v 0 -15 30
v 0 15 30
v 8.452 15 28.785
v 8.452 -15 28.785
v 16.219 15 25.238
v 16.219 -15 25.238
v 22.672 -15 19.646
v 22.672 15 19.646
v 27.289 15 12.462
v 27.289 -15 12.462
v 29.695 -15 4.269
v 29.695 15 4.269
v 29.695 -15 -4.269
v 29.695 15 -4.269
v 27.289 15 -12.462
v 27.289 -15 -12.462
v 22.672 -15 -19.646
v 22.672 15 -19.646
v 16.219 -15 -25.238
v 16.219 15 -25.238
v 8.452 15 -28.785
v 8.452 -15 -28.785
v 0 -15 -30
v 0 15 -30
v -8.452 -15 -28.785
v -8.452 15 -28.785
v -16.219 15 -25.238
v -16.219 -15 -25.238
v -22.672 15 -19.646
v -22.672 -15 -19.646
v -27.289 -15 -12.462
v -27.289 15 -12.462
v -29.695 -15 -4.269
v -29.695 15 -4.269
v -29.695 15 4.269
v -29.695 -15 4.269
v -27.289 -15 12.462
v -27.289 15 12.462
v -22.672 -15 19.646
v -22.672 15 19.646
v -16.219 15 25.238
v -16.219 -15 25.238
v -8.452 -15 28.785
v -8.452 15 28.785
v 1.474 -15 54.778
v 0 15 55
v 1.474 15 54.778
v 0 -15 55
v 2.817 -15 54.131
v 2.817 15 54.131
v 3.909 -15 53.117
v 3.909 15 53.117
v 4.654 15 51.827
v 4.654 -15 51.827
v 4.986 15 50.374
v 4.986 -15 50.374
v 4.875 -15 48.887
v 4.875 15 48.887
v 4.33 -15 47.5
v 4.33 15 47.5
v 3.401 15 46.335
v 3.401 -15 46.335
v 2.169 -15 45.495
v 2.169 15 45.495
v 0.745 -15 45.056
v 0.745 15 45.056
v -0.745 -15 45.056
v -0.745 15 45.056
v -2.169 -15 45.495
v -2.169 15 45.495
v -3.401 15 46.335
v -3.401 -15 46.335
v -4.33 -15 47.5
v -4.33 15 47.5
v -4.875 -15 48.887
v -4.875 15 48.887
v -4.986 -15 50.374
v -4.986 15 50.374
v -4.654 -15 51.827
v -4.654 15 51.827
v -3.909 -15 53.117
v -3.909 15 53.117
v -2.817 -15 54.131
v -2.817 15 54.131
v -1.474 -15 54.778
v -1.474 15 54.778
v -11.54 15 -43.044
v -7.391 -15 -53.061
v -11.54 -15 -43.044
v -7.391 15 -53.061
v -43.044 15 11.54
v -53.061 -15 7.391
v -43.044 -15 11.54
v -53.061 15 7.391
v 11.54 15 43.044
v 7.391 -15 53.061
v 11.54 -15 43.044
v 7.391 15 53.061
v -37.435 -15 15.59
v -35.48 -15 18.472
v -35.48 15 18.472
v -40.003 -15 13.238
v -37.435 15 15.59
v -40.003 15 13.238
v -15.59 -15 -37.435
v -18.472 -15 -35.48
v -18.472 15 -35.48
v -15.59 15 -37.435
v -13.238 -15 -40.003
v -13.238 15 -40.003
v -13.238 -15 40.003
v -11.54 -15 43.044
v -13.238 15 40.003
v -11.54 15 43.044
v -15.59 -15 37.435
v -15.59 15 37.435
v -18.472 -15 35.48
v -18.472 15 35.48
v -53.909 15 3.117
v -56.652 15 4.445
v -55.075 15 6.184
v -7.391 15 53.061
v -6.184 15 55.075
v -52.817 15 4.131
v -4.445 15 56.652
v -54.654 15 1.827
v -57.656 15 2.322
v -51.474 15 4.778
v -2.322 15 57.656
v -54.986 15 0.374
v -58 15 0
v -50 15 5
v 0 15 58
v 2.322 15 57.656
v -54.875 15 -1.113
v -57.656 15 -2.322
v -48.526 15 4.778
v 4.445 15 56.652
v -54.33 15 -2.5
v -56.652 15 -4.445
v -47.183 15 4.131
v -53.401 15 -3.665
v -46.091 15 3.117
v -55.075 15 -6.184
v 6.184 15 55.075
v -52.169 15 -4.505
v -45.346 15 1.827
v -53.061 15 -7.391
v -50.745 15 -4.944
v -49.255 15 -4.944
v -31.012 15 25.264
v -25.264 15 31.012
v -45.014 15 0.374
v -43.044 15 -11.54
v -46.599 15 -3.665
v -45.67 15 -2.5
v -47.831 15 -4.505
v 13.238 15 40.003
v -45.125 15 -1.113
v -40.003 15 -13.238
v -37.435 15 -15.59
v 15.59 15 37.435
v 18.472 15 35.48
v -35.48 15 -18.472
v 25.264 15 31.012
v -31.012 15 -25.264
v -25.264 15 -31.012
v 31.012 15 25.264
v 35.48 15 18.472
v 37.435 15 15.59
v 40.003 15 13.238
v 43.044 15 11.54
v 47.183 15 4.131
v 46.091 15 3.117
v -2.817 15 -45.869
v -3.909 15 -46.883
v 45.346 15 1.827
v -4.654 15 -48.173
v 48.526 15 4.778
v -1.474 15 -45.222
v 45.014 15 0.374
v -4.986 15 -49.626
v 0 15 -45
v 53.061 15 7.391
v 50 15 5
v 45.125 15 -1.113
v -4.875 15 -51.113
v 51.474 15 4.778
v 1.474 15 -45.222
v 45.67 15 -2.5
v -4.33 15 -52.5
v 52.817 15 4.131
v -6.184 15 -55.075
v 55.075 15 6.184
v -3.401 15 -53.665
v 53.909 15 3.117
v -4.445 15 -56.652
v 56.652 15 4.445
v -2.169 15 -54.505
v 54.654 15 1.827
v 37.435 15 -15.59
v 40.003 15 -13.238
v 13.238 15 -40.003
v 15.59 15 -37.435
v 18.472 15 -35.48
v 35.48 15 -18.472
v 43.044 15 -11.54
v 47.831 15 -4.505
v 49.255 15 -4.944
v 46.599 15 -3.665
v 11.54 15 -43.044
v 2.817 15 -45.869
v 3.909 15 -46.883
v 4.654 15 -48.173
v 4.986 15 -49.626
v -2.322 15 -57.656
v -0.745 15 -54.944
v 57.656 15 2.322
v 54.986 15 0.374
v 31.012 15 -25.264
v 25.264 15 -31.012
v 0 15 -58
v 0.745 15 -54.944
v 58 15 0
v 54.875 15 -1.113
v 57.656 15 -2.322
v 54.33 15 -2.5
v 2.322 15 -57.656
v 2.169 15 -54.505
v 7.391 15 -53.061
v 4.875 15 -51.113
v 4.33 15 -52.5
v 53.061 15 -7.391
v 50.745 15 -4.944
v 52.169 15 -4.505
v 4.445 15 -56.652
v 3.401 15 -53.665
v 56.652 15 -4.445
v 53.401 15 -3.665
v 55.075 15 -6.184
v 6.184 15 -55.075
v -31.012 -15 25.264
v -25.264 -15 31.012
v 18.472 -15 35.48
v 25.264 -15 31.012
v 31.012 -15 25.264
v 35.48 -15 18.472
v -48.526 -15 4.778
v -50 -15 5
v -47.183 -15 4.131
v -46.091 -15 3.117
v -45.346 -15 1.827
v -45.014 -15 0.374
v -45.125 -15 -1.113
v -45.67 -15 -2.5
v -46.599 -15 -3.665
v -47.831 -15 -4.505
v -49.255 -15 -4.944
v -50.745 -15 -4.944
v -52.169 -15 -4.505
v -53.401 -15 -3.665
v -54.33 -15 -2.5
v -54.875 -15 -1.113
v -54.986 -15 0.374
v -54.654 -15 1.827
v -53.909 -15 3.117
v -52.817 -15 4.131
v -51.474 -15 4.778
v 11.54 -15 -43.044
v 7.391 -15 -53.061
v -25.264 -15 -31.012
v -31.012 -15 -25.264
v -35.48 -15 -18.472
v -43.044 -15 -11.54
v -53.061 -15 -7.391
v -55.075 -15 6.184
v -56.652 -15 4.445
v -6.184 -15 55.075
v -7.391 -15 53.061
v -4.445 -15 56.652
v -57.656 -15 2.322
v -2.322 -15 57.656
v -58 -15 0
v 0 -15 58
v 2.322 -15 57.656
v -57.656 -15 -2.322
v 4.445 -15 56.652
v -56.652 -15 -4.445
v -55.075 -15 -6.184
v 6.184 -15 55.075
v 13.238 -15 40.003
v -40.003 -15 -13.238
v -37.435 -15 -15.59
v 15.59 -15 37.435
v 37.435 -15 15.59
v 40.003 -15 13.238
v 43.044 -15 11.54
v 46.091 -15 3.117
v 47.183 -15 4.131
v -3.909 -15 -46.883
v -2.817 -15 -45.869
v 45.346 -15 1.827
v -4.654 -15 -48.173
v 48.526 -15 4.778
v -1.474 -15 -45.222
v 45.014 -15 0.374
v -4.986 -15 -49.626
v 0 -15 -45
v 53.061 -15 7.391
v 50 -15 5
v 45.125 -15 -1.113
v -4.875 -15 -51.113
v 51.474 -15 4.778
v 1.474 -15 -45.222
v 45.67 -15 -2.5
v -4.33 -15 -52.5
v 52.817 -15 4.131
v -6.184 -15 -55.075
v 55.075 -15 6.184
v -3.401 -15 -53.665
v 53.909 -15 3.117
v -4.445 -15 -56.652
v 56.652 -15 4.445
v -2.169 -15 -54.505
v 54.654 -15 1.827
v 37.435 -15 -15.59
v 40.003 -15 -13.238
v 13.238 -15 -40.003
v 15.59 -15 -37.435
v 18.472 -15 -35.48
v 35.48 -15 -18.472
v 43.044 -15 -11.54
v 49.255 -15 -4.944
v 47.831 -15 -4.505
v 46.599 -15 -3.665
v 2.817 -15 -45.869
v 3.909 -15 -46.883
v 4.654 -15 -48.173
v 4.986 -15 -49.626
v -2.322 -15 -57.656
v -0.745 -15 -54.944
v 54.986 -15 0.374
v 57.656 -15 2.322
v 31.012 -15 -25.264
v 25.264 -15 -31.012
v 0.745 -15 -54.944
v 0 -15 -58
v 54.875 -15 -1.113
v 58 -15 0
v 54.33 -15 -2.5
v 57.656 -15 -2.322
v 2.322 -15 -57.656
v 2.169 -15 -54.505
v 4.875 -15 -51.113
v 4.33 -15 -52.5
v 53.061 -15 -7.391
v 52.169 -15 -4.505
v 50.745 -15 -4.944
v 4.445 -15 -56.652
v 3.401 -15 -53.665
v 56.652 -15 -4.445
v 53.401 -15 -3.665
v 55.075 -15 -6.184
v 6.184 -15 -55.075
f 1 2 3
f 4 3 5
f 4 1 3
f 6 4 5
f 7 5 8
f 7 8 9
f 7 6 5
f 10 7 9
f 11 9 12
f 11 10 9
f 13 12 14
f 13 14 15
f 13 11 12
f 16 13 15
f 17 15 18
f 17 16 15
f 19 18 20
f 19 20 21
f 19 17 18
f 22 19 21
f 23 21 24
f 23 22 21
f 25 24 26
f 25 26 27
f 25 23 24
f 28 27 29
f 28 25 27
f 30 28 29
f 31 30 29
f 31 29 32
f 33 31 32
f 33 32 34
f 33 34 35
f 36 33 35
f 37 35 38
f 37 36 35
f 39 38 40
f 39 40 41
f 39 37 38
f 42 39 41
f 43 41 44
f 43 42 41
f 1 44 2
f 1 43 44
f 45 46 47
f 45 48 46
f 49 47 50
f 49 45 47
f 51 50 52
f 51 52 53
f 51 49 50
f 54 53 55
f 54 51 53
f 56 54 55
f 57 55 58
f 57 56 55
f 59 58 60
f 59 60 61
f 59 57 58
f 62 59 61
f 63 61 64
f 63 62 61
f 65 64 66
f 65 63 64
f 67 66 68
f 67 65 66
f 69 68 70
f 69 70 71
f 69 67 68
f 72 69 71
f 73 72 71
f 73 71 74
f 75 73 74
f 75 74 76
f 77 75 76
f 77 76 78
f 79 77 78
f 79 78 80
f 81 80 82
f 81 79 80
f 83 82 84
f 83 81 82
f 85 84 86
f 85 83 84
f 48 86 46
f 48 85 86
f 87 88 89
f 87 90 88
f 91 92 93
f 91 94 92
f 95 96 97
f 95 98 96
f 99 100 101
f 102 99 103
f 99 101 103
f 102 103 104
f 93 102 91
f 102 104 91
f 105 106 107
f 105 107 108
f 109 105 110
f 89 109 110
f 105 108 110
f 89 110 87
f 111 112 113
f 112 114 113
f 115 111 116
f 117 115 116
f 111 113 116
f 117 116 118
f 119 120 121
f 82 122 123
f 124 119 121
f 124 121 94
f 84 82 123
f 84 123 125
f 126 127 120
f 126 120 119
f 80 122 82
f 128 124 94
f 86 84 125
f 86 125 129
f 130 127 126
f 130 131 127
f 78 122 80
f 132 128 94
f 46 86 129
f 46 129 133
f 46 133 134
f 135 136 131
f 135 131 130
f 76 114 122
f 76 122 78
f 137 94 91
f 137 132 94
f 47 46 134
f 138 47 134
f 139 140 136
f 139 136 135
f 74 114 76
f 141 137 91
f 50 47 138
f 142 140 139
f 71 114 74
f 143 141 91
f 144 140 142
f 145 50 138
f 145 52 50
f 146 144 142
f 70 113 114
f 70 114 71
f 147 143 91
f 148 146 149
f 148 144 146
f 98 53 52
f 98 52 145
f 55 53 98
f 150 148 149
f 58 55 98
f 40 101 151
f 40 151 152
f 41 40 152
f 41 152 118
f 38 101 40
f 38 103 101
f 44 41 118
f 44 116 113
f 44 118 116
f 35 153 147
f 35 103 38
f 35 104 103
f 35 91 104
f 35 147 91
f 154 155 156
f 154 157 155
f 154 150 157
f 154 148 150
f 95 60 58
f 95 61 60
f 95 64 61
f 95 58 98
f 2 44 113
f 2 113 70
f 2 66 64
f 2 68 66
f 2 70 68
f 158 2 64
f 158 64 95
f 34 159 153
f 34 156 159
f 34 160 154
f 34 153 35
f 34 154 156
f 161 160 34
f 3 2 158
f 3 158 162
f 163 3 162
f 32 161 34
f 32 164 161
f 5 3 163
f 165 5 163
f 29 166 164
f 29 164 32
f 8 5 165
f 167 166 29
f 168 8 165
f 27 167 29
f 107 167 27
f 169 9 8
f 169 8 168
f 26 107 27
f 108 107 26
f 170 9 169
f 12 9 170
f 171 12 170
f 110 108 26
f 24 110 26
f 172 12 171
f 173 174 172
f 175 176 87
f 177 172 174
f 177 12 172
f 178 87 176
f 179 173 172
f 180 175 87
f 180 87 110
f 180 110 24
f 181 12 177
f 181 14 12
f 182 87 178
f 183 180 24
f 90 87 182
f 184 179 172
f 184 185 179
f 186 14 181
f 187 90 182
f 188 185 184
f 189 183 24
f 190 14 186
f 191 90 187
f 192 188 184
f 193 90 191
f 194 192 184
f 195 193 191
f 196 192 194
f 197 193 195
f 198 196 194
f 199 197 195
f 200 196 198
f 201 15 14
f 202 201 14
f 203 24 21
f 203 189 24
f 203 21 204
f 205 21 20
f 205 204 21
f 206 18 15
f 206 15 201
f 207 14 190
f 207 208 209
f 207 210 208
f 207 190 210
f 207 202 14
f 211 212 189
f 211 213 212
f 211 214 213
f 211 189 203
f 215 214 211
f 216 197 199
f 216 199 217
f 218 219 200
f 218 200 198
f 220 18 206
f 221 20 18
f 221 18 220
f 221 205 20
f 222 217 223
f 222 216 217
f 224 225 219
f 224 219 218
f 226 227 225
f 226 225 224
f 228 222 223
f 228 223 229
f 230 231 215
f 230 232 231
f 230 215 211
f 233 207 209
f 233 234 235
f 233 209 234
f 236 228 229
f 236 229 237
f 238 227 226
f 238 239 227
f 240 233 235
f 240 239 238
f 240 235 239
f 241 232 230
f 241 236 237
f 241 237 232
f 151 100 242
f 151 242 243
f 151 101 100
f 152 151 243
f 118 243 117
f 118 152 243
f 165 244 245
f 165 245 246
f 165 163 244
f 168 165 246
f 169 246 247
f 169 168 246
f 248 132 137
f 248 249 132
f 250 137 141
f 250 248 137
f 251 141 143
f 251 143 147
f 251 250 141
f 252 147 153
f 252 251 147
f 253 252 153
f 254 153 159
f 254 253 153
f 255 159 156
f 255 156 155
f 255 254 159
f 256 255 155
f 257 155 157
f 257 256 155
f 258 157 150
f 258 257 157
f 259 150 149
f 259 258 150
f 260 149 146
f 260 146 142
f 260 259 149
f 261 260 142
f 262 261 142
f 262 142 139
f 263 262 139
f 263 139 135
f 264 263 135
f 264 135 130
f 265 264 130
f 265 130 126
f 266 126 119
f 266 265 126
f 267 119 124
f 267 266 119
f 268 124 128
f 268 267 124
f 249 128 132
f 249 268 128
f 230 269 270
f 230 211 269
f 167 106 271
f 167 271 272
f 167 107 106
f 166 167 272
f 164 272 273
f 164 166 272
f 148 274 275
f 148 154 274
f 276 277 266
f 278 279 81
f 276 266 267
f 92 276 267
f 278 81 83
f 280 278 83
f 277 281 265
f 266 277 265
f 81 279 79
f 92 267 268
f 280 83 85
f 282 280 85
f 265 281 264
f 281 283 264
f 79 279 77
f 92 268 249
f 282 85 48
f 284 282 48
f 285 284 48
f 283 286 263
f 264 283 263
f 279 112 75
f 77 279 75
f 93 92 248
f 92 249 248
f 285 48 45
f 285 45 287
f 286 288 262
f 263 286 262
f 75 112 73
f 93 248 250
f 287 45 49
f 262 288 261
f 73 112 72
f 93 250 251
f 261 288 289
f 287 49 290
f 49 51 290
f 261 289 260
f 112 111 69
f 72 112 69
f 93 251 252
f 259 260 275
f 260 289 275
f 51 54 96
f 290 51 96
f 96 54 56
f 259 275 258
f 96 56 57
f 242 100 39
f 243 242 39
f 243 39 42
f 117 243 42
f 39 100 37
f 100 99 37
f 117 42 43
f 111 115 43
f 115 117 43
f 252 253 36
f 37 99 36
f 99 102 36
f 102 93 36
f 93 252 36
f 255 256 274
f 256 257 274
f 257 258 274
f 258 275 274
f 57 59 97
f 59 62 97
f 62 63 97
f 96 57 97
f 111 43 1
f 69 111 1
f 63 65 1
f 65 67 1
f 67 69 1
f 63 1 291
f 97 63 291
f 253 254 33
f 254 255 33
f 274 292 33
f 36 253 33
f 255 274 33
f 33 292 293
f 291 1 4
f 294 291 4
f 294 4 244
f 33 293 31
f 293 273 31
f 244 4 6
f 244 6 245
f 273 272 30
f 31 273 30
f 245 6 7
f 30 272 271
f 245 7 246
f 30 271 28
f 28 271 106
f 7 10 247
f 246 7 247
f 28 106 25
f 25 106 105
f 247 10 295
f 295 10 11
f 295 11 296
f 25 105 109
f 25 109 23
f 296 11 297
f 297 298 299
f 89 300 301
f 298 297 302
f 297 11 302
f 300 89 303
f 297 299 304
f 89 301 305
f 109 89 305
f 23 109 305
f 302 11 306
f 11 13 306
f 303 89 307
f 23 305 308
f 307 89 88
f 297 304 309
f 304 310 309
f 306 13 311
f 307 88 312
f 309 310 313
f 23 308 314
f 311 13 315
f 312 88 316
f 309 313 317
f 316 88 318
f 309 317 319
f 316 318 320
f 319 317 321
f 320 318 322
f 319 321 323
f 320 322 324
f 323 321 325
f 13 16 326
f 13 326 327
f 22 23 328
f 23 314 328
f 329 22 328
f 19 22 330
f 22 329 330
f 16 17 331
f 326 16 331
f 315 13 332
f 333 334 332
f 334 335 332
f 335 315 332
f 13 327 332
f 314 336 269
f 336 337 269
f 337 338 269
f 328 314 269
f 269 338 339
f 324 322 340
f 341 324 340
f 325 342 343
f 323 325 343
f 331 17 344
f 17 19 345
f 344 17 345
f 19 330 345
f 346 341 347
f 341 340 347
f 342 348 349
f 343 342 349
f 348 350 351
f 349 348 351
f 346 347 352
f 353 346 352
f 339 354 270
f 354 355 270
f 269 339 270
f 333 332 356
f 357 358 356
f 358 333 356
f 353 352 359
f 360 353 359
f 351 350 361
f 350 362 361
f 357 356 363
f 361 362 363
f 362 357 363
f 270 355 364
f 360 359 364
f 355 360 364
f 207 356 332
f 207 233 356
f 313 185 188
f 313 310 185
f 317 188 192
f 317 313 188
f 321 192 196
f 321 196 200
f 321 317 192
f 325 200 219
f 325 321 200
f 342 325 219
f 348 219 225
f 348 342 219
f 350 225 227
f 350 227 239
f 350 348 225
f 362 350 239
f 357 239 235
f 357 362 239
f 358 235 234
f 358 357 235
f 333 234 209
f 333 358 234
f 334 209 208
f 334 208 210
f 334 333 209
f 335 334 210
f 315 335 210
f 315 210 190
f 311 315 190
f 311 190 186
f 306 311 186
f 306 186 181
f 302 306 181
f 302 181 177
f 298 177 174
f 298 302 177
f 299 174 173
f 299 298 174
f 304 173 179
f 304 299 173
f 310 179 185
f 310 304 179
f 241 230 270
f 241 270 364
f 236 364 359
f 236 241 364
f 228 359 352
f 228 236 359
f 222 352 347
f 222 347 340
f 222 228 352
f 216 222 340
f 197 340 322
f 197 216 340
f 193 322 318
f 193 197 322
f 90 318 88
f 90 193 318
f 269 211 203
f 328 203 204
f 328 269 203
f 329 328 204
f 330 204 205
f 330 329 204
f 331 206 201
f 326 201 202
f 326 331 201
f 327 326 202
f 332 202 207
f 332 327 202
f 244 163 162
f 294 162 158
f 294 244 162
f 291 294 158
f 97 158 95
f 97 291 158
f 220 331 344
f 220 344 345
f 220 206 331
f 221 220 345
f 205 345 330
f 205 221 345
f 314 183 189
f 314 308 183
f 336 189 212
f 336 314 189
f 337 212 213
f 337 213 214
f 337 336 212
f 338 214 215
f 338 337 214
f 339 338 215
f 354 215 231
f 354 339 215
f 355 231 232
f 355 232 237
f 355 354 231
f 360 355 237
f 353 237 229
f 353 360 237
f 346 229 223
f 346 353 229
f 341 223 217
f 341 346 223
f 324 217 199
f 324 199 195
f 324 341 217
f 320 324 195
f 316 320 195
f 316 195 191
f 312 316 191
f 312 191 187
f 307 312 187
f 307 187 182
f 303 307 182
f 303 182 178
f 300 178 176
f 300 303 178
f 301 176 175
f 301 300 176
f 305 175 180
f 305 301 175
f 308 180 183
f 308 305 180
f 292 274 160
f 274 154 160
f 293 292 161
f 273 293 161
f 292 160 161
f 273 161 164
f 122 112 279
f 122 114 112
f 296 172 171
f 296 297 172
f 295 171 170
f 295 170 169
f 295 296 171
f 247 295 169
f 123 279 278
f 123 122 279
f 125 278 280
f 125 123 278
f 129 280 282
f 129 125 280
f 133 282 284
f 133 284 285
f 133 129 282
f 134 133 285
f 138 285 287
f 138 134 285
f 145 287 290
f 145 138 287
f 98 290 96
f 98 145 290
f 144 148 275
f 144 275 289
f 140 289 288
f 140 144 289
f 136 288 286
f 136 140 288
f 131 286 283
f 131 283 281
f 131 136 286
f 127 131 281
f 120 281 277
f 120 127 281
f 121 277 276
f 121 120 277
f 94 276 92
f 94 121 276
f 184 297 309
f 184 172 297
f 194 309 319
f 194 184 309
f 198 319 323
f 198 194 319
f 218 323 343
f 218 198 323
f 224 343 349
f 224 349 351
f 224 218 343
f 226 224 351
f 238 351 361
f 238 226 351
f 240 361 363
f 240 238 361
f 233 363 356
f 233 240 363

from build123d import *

# Parameters (mm, degrees)
SKETCH1_R           = 30
SKETCH1_R_2         = 5
BOSS_EXTRUDE1_DEPTH = 15
FILLET1_R           = 15


with BuildPart() as part:
    # Sketch1 → Boss-Extrude1 (new, symmetric)
    with BuildSketch(Plane(origin=(0, 0, 0), x_dir=(1, 0, 0), z_dir=(0, 1, 0))):
        with BuildLine():
            Line((13.821869985, 37.536061462), (7.39103626, 53.061467459))
            ThreePointArc((7.39103626, 53.061467459), (0, 58), (-7.39103626, 53.061467459))
            Line((-7.39103626, 53.061467459), (-13.821869985, 37.536061462))
            ThreePointArc((-13.821869985, 37.536061462), (-28.284271247, 28.284271247), (-37.536061462, 13.821869985))
            Line((-37.536061462, 13.821869985), (-53.061467459, 7.39103626))
            ThreePointArc((-53.061467459, 7.39103626), (-58, 0), (-53.061467459, -7.39103626))
            Line((-53.061467459, -7.39103626), (-37.536061462, -13.821869985))
            ThreePointArc((-37.536061462, -13.821869985), (-28.284271247, -28.284271247), (-13.821869985, -37.536061462))
            Line((-13.821869985, -37.536061462), (-7.39103626, -53.061467459))
            ThreePointArc((-7.39103626, -53.061467459), (0, -58), (7.39103626, -53.061467459))
            Line((7.39103626, -53.061467459), (13.821869985, -37.536061462))
            ThreePointArc((13.821869985, -37.536061462), (28.284271247, -28.284271247), (37.536061462, -13.821869985))
            Line((37.536061462, -13.821869985), (53.061467459, -7.39103626))
            ThreePointArc((53.061467459, -7.39103626), (58, 0), (53.061467459, 7.39103626))
            Line((53.061467459, 7.39103626), (37.536061462, 13.821869985))
            ThreePointArc((37.536061462, 13.821869985), (28.284271247, 28.284271247), (13.821869985, 37.536061462))
        make_face()
        with Locations(Location((0, 0, 0), (0, 0, 270))):
            Circle(SKETCH1_R, mode=Mode.SUBTRACT)
        with Locations(Location((0, 50, 0), (0, 0, 270))):
            Circle(SKETCH1_R_2, mode=Mode.SUBTRACT)
        with Locations(Location((-50, 0, 0), (0, 0, 270))):
            Circle(SKETCH1_R_2, mode=Mode.SUBTRACT)
        with Locations(Location((50, 0, 0), (0, 0, 270))):
            Circle(SKETCH1_R_2, mode=Mode.SUBTRACT)
        with Locations(Location((0, -50, 0), (0, 0, 270))):
            Circle(SKETCH1_R_2, mode=Mode.SUBTRACT)
    extrude(amount=BOSS_EXTRUDE1_DEPTH, both=True)

    # Fillet1
    fillet1_edges = [part.edges().sort_by_distance(p)[0] for p in [
        (-37.536061462, 0, -13.821869985),
        (-13.821869985, 0, -37.536061462),
        (13.821869985, 0, -37.536061462),
        (37.536061462, 0, -13.821869985),
        (37.536061462, 0, 13.821869985),
        (13.821869985, 0, 37.536061462),
        (-13.821869985, 0, 37.536061462),
        (-37.536061462, 0, 13.821869985),
    ]]
    fillet(fillet1_edges, radius=FILLET1_R)


solid = part.part
